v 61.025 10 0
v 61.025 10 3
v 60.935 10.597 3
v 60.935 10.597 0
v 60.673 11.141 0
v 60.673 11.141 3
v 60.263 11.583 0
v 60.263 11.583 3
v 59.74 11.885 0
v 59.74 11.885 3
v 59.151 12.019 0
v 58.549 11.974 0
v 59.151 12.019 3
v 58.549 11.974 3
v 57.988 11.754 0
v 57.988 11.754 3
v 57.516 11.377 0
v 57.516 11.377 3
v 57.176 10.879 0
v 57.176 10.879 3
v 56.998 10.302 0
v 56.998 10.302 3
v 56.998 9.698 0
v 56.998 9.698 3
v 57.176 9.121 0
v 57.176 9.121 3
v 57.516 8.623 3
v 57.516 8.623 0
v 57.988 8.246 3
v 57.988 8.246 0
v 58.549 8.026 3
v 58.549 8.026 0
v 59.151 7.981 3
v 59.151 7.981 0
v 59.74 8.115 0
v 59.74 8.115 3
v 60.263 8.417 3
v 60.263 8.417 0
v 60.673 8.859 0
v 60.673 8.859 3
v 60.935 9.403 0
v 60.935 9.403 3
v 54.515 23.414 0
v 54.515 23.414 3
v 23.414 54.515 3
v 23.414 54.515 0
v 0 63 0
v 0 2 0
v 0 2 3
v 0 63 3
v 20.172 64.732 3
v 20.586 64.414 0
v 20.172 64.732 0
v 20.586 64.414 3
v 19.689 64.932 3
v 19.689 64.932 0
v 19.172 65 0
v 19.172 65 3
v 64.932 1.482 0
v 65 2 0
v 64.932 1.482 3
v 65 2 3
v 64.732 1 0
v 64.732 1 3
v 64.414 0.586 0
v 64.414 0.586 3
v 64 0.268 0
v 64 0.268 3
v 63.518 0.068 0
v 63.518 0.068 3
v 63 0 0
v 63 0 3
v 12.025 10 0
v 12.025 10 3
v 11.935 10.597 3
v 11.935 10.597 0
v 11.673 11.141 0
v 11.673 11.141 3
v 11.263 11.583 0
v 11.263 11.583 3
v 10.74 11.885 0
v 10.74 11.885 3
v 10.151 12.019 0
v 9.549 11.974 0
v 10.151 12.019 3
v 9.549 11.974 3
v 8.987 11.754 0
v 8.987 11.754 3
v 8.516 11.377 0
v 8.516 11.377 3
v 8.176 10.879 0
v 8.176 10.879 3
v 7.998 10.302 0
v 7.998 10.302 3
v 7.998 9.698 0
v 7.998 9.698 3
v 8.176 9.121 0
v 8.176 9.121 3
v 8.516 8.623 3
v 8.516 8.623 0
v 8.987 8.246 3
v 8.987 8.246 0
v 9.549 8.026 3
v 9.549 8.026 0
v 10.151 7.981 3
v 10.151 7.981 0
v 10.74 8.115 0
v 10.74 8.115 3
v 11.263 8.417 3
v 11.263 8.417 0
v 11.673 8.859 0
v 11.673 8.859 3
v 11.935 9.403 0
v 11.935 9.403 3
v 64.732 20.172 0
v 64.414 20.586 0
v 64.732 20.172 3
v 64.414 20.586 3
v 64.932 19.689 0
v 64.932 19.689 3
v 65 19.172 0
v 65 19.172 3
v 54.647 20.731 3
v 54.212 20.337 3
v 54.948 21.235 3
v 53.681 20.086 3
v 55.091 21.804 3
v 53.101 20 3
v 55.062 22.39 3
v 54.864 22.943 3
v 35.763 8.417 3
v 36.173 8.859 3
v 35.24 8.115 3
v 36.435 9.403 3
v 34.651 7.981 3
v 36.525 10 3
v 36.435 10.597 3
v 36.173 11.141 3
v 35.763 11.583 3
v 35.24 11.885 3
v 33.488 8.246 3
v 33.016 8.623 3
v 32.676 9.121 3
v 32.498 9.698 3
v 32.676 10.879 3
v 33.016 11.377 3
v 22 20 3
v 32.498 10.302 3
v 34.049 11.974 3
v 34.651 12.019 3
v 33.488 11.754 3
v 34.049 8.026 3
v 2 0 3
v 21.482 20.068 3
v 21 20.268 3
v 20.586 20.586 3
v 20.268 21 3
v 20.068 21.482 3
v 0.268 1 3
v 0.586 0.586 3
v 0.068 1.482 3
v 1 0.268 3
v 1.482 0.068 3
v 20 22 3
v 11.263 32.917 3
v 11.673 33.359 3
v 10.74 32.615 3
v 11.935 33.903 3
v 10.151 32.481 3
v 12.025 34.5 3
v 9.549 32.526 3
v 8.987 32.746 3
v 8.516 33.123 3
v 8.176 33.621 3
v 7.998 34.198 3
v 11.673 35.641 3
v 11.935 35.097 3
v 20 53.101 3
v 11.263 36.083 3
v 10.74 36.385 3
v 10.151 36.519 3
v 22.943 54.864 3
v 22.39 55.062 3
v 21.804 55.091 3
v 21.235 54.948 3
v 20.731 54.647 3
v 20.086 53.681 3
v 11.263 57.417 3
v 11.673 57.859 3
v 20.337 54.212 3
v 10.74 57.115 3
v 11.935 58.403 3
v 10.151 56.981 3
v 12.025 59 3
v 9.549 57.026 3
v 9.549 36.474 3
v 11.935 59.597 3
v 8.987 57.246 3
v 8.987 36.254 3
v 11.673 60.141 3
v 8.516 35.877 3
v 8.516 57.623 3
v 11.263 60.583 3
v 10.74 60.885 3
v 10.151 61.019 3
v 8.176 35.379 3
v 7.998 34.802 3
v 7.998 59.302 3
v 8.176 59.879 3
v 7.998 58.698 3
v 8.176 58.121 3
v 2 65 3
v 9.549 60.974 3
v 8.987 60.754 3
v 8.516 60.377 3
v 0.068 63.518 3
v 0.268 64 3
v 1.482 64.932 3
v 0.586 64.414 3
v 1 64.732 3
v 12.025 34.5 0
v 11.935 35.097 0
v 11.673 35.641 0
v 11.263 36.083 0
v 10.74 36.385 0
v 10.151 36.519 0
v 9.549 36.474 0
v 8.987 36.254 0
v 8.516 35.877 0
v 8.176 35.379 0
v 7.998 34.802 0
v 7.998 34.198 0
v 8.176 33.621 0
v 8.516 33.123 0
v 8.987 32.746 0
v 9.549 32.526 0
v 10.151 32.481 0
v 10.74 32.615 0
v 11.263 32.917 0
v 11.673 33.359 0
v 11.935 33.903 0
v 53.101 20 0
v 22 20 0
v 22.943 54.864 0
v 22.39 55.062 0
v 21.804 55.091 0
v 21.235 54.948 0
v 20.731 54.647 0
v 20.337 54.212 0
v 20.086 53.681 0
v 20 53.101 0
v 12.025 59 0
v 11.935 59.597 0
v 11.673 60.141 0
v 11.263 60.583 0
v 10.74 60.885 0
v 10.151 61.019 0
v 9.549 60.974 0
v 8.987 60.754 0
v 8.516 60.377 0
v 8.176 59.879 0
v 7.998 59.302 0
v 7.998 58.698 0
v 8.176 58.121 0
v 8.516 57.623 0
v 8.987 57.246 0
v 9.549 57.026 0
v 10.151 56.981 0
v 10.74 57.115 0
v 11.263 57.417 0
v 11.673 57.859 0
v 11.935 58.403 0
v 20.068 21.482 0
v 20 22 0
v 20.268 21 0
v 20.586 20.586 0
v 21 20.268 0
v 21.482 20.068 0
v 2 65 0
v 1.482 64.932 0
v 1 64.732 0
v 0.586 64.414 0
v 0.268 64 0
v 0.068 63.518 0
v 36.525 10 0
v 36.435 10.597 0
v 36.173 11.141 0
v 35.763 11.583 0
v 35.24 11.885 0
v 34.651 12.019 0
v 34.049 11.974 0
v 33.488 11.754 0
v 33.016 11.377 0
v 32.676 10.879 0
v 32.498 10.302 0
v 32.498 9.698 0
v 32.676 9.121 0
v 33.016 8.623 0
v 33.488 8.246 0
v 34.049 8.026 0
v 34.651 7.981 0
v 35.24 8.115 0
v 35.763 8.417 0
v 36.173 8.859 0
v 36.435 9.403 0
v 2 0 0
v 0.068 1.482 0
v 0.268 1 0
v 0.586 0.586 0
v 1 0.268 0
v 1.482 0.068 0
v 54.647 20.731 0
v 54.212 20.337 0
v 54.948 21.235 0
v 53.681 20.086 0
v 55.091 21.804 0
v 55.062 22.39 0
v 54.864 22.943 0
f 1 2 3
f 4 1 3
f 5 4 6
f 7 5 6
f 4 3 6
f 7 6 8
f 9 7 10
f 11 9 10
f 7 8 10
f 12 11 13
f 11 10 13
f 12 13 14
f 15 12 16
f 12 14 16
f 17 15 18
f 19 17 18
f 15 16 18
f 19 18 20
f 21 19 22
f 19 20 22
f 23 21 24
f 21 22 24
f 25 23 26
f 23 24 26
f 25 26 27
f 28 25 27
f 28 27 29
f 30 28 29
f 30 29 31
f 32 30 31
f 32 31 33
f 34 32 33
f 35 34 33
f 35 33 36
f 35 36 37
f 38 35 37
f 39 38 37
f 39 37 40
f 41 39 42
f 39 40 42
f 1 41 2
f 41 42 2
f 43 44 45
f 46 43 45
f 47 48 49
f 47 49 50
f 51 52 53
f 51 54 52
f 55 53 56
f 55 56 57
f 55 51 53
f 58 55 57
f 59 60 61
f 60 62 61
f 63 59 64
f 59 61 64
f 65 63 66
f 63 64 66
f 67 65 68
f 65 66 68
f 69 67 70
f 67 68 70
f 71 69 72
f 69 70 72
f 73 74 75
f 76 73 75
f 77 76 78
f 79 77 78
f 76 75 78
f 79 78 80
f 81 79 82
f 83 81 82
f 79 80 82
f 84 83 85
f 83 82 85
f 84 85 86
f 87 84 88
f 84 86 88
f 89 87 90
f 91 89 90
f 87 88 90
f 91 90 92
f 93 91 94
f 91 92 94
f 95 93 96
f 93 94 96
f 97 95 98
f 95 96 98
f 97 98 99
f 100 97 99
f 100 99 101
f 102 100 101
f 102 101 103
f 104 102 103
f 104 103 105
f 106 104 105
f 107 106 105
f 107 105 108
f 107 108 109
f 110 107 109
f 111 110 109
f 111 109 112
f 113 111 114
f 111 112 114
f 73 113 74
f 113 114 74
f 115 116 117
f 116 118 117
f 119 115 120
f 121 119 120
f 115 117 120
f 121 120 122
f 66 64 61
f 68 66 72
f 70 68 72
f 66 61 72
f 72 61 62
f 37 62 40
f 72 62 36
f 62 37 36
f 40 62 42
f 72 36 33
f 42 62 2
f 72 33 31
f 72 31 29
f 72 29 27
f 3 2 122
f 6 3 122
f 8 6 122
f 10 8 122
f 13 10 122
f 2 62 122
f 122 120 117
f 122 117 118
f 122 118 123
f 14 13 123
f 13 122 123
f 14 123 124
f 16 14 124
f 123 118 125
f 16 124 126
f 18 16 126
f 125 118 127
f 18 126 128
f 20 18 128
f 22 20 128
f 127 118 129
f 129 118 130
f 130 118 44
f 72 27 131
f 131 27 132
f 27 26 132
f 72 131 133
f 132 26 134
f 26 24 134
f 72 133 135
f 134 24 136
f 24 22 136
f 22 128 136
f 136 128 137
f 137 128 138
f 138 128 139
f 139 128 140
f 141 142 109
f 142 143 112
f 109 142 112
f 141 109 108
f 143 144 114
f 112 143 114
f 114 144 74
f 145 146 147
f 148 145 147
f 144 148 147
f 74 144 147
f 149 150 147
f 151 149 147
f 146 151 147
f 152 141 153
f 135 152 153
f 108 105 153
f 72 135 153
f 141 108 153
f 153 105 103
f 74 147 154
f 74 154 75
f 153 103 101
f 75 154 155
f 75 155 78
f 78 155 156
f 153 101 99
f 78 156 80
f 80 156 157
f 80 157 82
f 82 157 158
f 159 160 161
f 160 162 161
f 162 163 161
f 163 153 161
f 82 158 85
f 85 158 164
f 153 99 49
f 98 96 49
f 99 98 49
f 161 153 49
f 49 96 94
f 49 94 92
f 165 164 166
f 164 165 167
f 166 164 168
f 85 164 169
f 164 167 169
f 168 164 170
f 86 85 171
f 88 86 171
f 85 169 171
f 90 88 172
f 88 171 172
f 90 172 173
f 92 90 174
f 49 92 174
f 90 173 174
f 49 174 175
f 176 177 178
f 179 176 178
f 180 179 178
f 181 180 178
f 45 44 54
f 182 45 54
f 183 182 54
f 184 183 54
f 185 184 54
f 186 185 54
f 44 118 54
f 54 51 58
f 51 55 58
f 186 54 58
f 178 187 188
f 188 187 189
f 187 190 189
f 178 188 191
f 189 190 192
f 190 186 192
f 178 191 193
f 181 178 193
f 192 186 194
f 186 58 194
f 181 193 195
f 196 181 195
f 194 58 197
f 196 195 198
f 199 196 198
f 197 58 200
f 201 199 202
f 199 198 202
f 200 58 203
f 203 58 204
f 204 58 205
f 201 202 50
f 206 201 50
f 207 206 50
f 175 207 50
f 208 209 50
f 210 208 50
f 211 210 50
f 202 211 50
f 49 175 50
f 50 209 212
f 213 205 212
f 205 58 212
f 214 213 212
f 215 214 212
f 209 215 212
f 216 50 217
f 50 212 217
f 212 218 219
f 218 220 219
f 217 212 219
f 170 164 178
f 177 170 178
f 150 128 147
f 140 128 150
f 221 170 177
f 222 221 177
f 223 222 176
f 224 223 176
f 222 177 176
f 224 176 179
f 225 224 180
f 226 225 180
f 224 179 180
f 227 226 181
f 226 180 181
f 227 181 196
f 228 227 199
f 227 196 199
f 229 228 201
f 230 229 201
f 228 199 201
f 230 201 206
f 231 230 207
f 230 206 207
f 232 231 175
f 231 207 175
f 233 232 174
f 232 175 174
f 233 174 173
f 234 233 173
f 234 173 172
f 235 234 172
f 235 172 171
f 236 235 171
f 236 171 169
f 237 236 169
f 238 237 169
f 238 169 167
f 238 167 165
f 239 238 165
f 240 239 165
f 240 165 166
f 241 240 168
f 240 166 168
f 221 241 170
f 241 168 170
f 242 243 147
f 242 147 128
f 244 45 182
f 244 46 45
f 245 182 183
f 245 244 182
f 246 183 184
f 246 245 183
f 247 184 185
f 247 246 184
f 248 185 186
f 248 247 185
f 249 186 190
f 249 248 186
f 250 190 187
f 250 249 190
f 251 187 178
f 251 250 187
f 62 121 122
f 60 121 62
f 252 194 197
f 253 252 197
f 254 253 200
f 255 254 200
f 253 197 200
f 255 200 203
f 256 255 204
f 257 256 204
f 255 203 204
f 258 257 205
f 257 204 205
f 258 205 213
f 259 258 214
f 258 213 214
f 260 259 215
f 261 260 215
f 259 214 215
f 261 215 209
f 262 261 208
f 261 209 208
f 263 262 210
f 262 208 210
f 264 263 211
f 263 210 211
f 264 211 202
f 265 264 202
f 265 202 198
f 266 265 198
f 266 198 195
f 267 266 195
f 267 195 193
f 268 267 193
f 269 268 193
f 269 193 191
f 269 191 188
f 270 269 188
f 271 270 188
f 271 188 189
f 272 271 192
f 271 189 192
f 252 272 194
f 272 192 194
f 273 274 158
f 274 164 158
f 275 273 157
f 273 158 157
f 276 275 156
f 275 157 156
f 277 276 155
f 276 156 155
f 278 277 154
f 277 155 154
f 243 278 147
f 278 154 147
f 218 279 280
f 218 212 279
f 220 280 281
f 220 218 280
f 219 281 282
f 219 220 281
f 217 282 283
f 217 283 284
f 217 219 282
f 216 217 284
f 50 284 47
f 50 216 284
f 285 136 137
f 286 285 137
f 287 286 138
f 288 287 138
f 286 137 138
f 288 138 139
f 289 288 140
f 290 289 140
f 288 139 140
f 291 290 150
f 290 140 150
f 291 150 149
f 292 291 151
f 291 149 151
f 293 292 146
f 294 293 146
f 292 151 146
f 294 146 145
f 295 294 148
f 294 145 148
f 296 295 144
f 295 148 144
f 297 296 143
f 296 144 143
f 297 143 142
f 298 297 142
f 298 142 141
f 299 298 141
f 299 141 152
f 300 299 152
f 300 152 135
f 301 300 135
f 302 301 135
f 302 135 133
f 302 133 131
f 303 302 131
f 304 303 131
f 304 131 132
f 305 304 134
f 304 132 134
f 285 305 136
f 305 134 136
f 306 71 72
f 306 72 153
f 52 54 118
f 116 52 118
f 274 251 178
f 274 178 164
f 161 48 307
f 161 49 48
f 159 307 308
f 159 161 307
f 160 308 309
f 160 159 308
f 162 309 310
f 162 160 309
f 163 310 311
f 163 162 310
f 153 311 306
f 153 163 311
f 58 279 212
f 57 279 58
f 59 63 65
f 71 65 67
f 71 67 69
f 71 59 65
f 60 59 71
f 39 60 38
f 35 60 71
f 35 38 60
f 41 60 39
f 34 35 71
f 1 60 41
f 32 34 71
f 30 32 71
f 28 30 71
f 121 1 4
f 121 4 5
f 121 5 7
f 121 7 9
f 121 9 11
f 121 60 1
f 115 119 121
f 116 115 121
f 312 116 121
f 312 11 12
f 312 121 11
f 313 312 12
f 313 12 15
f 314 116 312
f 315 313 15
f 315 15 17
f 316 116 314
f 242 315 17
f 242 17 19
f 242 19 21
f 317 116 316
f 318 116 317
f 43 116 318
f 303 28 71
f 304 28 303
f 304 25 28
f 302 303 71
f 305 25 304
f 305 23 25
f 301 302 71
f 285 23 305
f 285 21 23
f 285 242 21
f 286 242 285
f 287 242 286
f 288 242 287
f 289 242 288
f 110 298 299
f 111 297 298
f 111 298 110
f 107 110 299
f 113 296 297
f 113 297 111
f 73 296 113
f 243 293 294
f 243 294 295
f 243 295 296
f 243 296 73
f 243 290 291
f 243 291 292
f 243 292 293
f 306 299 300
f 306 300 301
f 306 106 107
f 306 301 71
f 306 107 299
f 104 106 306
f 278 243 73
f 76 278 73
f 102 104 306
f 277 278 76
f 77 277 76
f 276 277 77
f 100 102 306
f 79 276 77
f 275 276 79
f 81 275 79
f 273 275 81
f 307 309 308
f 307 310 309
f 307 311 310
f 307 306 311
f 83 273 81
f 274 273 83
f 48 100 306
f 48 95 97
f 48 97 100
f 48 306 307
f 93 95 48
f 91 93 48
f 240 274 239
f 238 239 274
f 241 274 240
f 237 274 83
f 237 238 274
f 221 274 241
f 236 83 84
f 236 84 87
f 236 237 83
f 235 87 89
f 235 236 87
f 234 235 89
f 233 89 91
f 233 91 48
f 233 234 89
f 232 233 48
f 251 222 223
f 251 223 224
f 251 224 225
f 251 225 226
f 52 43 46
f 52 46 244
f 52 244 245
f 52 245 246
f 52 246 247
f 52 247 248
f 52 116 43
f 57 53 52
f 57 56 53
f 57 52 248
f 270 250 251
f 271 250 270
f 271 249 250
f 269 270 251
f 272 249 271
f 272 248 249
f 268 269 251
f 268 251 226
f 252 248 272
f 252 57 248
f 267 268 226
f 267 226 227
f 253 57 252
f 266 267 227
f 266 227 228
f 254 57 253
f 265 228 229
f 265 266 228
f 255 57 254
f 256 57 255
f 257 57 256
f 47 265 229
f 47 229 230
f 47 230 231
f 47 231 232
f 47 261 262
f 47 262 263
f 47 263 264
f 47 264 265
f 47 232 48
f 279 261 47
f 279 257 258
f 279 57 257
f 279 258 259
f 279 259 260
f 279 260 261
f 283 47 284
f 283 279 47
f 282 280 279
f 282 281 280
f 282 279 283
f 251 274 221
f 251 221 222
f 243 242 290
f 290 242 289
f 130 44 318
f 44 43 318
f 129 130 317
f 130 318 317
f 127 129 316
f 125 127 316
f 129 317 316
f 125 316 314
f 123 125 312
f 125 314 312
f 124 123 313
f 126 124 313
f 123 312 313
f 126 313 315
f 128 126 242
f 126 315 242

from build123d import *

# Parameters (mm, degrees)
EXTRUDE_1_DEPTH     = 3
SKETCH_2_R          = 2.025
CUT_EXTRUDE_1_DEPTH = 3
EXTRUDE_2_DEPTH     = 3
FILLET_1_R          = 2


with BuildPart() as part:
    # 草图1 → 凸台-拉伸1 (new body)
    with BuildSketch(Plane.XY):
        Polygon((0, 0), (0, 65), (20, 65), (20, 20), (65, 20), (65, 0), align=None)
    extrude(amount=EXTRUDE_1_DEPTH)

    # 草图2 → 切除-拉伸1 (cut)
    with BuildSketch(Plane.XY.offset(3)):
        with Locations((10, 59)):
            Circle(SKETCH_2_R)
        with Locations((10, 34.5)):
            Circle(SKETCH_2_R)
        with Locations((10, 10)):
            Circle(SKETCH_2_R)
        with Locations((34.5, 10)):
            Circle(SKETCH_2_R)
        with Locations((59, 10)):
            Circle(SKETCH_2_R)
    extrude(amount=-CUT_EXTRUDE_1_DEPTH, mode=Mode.SUBTRACT)

    # 草图3 → 凸台-拉伸2 (add)
    with BuildSketch(Plane.XY.offset(3)):
        Polygon((20, 65), (65, 20), (57.928932188, 20), (20, 57.928932188), align=None)
    extrude(amount=-EXTRUDE_2_DEPTH)

    # 圆角1
    fillet_1_edges = [part.edges().sort_by_distance(p)[0] for p in [
        (0, 0, 1.5),
        (0, 65, 1.5),
        (20, 65, 1.5),
        (20, 20, 1.5),
        (65, 20, 1.5),
        (65, 0, 1.5),
        (57.928932188, 20, 1.5),
        (20, 57.928932188, 1.5),
    ]]
    fillet(fillet_1_edges, radius=FILLET_1_R)


solid = part.part
